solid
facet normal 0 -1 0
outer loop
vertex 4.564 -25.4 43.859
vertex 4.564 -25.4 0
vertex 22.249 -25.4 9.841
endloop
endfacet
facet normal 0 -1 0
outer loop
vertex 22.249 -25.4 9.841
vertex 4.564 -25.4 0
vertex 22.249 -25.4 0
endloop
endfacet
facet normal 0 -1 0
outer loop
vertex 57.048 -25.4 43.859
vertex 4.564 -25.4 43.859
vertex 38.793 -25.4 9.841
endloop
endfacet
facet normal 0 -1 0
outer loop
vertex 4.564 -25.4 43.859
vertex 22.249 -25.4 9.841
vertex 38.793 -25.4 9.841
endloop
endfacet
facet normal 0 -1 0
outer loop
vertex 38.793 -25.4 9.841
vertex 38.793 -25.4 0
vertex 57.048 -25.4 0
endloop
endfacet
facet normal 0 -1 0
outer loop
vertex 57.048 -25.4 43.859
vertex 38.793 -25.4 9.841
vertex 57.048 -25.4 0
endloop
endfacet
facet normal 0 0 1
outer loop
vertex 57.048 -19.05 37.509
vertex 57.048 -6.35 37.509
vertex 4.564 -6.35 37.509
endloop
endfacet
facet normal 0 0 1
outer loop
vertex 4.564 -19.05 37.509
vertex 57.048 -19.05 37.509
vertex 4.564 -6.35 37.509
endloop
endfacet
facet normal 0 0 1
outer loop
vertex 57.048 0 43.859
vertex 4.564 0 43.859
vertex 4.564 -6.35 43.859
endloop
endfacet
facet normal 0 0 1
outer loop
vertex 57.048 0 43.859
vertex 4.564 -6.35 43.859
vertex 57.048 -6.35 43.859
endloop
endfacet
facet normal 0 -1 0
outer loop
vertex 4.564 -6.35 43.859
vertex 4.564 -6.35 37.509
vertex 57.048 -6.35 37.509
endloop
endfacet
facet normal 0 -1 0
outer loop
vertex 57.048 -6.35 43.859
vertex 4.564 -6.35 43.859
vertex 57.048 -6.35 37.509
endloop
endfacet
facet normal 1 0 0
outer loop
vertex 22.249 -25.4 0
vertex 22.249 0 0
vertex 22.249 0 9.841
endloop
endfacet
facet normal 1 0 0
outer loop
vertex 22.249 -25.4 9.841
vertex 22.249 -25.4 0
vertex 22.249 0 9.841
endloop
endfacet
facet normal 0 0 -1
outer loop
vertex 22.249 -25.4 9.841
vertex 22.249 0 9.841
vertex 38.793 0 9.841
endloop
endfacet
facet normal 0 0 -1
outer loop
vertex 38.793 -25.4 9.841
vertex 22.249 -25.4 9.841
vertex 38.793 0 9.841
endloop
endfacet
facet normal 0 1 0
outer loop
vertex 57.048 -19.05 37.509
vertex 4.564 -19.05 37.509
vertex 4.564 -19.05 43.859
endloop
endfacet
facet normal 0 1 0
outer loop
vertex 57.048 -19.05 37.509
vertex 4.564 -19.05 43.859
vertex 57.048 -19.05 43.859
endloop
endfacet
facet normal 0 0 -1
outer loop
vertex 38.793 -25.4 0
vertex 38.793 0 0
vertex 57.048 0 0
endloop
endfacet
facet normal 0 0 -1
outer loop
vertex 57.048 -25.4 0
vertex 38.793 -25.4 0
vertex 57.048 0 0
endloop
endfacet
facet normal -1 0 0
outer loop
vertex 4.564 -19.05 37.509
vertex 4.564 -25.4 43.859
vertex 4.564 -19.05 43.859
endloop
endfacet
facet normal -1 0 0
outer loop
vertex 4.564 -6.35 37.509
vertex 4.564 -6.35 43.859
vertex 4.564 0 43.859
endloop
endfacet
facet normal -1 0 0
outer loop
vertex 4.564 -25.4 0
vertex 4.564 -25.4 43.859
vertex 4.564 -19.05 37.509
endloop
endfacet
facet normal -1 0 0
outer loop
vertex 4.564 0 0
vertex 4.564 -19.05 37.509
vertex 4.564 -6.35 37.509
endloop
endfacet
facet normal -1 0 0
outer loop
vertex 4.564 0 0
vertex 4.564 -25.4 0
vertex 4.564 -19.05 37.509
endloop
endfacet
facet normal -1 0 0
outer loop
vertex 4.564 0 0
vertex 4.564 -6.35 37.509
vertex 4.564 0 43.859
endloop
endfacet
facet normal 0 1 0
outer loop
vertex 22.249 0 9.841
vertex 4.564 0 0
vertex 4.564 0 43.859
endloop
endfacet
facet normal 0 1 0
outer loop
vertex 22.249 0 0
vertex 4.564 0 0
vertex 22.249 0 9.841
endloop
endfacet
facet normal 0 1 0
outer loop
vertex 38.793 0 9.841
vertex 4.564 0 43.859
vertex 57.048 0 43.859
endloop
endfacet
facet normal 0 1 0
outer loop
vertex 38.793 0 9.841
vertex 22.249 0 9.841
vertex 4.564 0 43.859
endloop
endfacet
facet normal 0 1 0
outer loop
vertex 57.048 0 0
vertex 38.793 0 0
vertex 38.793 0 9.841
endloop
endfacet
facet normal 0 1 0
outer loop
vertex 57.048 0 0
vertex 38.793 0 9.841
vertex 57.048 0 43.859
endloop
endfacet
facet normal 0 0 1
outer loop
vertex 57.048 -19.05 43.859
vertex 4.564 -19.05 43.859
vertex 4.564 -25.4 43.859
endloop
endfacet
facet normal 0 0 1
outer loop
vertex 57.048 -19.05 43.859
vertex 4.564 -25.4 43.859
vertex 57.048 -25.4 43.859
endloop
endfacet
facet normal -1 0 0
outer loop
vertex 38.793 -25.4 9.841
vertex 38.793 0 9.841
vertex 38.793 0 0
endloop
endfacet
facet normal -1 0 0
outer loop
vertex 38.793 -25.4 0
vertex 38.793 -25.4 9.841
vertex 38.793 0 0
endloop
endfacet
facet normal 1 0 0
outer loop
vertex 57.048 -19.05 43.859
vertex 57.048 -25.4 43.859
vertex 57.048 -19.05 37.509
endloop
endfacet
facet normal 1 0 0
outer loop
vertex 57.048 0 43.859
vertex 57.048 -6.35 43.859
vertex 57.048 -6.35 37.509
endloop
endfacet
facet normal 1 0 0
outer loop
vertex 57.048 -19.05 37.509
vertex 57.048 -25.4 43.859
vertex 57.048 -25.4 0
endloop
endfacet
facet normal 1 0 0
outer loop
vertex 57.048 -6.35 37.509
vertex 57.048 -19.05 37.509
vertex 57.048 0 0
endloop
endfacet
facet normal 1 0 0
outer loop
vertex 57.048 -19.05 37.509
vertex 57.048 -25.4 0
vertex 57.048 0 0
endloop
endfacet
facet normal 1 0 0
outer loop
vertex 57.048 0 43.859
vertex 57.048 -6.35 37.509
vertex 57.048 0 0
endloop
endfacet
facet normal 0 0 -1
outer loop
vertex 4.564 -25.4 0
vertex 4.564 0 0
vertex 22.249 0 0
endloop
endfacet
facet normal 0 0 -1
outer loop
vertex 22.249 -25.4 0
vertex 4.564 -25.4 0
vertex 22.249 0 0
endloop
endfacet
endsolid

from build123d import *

# Parameters (mm, degrees)
F1_DEPTH = 25.4
F2_W     = 52.48428
F2_H     = 6.35
F3_DEPTH = 6.35
F4_W     = 52.48428
F4_H     = 6.35
F5_DEPTH = 6.35


with BuildPart() as f1:
    # F0 (on Front) → F1 (new body)
    with BuildSketch(Plane.XZ):
        Polygon((4.563851, 37.509143), (4.563851, 0), (22.248767, 0), (22.248767, 9.840802), (38.792729, 9.840802), (38.792729, 0), (57.048131, 0), (57.048131, 37.509143), align=None)
    extrude(amount=F1_DEPTH)

    # F2 (on face) → F3 (join)
    with BuildSketch(Plane.XY.offset(37.509143)):
        with Locations((30.805991, -3.175)):
            Rectangle(F2_W, F2_H)
    extrude(amount=F3_DEPTH)

    # F4 (on face) → F5 (join)
    with BuildSketch(Plane.XY.offset(37.509143)):
        with Locations((30.805991, -22.225)):
            Rectangle(F4_W, F4_H)
    extrude(amount=F5_DEPTH)


solid = f1.part
